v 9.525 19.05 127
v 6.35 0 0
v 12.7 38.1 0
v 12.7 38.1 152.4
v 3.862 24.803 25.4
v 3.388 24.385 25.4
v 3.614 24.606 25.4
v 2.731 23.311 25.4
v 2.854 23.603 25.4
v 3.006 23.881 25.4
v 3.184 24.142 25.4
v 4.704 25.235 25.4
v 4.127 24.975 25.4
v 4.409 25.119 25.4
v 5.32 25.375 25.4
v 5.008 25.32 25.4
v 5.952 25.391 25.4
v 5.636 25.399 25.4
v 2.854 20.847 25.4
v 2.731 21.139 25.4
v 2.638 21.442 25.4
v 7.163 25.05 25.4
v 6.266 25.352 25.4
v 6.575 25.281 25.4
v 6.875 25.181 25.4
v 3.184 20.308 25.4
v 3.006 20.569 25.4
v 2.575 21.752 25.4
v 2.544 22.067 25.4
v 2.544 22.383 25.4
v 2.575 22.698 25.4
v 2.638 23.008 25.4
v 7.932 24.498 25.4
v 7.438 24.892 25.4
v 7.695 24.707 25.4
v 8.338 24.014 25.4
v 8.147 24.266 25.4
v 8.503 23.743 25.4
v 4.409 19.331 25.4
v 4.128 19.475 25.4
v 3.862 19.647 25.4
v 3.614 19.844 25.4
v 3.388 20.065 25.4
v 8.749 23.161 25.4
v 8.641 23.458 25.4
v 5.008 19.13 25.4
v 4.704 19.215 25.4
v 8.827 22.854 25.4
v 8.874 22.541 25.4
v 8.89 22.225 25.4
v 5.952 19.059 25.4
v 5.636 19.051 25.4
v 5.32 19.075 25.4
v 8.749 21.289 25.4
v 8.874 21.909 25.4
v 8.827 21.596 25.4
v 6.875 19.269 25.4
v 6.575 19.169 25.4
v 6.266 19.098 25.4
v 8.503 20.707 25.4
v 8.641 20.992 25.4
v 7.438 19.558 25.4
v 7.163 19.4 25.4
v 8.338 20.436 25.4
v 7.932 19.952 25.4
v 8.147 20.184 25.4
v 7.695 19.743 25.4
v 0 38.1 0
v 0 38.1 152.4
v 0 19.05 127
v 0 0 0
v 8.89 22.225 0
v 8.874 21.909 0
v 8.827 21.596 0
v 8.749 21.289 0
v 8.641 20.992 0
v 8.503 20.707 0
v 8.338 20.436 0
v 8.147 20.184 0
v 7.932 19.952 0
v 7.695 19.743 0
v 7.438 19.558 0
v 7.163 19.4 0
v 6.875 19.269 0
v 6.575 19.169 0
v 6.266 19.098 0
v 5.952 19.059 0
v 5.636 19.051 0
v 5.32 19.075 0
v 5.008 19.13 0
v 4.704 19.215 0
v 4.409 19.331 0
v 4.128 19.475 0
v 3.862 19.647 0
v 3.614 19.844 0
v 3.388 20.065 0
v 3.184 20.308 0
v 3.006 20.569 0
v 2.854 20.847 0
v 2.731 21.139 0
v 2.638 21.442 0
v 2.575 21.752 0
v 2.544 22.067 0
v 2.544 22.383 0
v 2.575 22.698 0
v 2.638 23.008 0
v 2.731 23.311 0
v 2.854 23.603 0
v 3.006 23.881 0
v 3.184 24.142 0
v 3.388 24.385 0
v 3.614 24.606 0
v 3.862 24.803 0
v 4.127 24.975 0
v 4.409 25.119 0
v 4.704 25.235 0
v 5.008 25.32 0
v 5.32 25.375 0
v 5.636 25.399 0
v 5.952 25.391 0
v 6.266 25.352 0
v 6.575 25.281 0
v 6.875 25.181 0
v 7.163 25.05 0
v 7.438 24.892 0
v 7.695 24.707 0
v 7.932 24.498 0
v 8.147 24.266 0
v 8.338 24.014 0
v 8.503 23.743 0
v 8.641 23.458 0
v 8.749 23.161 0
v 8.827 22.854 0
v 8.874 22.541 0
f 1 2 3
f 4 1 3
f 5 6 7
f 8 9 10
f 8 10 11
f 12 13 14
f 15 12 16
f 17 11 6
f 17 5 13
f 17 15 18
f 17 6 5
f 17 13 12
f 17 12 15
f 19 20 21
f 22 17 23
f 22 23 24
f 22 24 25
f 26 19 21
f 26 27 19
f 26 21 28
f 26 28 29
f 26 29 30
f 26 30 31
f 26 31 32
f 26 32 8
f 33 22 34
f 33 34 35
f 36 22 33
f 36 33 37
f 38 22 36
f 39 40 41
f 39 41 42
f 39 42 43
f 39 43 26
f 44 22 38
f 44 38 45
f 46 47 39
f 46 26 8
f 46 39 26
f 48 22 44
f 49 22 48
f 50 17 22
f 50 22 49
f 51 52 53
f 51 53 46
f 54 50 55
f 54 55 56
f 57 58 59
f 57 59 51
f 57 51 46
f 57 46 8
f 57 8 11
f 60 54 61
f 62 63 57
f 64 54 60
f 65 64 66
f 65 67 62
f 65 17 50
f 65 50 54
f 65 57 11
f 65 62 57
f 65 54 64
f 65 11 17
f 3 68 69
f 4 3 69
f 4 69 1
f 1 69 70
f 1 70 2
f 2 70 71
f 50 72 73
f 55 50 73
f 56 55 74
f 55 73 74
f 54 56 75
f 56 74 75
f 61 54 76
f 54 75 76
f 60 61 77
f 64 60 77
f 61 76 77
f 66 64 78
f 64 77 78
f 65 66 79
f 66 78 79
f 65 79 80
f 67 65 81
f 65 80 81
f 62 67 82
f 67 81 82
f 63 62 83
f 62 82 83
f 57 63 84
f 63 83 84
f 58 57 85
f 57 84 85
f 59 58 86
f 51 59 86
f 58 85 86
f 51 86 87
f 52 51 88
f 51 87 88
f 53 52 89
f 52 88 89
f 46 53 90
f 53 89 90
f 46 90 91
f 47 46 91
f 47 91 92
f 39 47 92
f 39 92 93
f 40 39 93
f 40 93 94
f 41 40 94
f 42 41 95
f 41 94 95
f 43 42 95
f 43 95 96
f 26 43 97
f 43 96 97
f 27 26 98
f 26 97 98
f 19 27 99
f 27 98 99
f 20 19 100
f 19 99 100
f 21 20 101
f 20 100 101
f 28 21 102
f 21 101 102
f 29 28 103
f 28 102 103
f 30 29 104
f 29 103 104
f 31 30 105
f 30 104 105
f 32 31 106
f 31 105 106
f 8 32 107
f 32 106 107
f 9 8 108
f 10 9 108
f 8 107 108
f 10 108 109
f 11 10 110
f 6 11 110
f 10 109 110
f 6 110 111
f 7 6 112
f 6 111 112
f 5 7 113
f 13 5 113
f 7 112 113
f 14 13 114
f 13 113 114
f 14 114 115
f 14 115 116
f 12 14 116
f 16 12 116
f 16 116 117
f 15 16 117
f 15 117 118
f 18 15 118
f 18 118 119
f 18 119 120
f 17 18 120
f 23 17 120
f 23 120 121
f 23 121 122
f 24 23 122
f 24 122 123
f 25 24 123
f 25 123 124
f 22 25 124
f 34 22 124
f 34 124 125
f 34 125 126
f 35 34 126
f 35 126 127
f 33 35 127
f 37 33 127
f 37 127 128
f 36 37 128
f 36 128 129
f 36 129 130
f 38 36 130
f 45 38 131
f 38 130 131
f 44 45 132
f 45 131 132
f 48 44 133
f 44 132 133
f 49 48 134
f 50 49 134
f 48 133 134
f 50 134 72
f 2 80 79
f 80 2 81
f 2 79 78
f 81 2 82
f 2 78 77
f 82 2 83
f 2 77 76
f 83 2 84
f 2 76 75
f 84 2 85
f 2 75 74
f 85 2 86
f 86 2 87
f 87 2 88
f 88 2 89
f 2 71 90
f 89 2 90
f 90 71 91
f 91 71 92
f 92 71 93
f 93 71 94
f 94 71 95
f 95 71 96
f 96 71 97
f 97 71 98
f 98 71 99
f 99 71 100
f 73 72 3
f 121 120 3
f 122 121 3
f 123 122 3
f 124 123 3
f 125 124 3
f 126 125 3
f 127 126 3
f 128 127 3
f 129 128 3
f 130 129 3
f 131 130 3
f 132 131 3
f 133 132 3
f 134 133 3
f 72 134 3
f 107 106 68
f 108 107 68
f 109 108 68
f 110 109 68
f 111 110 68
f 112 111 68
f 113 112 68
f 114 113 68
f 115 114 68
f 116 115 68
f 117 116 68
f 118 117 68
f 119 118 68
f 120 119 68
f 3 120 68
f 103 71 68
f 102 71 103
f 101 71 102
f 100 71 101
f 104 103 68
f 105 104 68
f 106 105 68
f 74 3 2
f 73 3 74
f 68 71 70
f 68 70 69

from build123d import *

# Parameters (mm, degrees)
F1_DEPTH = 12.7
F2_R     = 3.175
F3_DEPTH = 25.4
F5_DEPTH = 254


with BuildPart() as f1:
    # F0 (on Right) → F1 (new body)
    with BuildSketch(Plane.YZ):
        Polygon((19.05, 127), (0, 0), (38.1, 0), (38.1, 152.4), align=None)
    extrude(amount=F1_DEPTH)

    # F2 (on face) → F3 (cut)
    with BuildSketch(Plane(origin=(0, 0, 0), x_dir=(1, 0, 0), z_dir=(0, 0, -1))):
        with Locations((5.715, -22.225)):
            Circle(F2_R)
    extrude(amount=-F3_DEPTH, mode=Mode.SUBTRACT)

    # F4 (on face) → F5 (cut)
    with BuildSketch(Plane(origin=(0, 0, 0), x_dir=(1, 0, 0), z_dir=(0, 0, -1))):
        Polygon((6.35, 0), (12.7, -38.1), (12.7, 0), align=None)
    extrude(amount=-F5_DEPTH, mode=Mode.SUBTRACT)


solid = f1.part
